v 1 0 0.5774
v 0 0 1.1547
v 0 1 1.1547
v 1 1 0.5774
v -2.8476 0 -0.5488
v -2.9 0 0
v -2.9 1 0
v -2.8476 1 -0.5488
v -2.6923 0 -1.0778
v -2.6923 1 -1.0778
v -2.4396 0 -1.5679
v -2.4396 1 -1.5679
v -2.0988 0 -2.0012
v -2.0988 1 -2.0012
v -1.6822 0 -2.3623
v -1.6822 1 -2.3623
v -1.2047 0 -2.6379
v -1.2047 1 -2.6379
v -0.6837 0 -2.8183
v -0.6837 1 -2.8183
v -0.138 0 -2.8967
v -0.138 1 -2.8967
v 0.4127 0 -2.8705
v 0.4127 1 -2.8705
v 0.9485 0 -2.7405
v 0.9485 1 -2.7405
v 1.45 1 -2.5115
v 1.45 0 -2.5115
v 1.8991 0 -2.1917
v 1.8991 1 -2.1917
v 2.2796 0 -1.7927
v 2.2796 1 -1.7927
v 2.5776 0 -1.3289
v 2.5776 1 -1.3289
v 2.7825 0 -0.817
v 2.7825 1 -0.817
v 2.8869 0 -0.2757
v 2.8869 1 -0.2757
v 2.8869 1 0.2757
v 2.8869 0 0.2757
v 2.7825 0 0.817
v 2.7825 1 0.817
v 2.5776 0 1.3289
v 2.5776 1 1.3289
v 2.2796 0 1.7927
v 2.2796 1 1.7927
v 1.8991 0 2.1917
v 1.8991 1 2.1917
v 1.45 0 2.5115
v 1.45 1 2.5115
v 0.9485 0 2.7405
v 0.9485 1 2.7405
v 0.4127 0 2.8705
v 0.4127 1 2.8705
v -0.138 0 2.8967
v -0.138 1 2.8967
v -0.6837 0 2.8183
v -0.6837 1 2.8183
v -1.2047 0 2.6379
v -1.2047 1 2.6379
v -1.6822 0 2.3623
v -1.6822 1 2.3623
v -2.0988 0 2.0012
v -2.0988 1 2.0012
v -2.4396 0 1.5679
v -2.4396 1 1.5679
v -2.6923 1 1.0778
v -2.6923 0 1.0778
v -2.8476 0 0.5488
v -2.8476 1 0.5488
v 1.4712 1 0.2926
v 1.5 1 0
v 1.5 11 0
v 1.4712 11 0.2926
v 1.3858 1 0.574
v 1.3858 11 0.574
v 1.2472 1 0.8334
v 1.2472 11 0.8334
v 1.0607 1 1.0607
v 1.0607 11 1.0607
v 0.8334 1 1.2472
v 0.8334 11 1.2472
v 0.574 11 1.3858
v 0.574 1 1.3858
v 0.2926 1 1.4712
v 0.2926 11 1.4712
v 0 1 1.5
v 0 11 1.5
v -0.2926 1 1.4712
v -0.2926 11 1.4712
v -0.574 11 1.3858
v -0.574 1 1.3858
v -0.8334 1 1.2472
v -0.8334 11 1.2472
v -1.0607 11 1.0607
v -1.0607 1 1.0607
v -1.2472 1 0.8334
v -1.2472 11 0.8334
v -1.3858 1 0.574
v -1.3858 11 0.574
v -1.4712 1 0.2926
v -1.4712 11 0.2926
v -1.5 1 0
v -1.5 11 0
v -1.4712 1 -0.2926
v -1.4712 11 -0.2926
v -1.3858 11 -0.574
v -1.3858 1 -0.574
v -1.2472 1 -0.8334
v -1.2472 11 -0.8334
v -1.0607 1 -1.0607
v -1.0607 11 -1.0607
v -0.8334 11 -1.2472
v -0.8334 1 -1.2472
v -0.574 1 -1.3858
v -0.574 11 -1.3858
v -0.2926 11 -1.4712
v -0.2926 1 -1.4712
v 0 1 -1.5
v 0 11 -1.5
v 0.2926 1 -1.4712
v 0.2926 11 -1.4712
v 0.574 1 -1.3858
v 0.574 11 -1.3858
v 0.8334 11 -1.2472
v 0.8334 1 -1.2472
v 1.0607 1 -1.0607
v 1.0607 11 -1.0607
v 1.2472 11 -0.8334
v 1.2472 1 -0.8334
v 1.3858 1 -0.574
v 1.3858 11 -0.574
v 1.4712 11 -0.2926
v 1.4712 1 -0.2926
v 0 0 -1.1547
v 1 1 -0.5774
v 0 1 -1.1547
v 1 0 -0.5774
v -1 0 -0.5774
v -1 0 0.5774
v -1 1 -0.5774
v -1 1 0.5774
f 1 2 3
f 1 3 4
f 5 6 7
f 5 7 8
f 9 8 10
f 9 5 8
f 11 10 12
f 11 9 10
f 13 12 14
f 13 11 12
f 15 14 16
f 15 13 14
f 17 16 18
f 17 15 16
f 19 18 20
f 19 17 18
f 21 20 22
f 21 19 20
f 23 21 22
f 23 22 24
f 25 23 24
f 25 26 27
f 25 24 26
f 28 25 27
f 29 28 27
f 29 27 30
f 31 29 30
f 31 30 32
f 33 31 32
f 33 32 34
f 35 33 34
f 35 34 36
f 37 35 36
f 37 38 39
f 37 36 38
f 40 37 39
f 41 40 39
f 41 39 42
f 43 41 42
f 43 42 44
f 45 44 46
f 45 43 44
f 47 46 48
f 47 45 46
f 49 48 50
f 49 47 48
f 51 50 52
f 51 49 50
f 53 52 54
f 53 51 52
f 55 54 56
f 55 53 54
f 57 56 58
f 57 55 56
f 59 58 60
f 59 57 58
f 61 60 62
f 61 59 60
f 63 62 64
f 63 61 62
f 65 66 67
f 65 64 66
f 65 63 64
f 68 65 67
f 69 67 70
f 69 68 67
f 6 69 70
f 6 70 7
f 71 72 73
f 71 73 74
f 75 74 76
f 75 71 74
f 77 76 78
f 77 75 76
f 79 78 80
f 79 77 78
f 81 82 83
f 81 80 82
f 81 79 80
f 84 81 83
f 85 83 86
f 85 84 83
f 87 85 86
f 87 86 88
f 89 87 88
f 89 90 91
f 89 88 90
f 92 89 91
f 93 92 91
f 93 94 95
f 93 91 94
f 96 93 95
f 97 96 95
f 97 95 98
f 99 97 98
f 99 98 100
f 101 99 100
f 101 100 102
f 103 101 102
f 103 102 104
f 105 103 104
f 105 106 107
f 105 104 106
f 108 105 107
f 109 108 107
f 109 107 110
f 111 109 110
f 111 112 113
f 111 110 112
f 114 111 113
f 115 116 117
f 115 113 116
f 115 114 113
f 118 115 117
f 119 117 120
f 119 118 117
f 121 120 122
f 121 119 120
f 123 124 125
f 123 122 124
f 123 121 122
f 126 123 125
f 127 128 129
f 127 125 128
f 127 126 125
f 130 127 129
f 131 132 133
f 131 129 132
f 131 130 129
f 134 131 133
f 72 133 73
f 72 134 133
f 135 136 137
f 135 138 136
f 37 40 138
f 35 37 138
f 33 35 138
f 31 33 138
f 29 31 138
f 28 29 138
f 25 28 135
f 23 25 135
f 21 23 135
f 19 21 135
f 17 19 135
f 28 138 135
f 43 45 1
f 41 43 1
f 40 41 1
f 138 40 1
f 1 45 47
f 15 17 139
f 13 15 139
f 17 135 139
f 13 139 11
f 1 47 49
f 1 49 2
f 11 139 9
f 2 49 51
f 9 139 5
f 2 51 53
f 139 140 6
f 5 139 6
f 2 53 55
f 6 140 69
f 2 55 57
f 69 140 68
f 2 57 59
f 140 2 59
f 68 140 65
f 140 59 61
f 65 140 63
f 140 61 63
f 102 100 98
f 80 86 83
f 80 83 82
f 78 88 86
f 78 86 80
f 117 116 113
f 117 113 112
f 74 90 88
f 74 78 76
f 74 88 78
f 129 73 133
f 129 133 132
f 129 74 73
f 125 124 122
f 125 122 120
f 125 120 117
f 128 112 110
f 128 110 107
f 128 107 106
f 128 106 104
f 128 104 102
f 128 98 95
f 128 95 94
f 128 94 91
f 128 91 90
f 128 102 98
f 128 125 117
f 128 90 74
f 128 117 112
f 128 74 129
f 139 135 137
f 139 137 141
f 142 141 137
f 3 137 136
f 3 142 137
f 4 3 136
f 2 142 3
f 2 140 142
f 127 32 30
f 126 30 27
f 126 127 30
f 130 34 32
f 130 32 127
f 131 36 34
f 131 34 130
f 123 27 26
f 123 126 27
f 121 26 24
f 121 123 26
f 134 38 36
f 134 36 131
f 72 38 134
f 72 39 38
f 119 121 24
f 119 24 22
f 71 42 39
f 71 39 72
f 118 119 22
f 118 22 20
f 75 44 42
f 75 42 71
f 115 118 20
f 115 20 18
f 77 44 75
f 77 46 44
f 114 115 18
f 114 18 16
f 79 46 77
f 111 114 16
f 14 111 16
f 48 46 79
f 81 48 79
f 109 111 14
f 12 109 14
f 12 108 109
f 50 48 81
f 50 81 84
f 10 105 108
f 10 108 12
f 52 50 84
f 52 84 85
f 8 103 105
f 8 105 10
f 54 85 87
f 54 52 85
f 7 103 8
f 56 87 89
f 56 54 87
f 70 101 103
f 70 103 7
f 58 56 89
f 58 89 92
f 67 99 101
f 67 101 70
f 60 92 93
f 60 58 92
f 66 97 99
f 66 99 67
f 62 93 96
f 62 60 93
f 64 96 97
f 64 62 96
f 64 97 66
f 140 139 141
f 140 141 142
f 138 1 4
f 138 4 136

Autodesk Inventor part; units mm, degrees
ref_plane "YZ Plane" through (0, 0, 0) normal (1, 0, 0) x (0, 1, 0)
ref_plane "XZ Plane" through (0, 0, 0) normal (0, 1, 0) x (-1, 0, 0)
ref_plane "XY Plane" through (0, 0, 0) normal (0, 0, 1) x (1, 0, 0)
sketch "Sketch1" plane through (0, 0, 0) normal (0, 1, 0) x (-1, 0, 0)
  circle A0 centre (0, 0) radius 2.9
  dimension "d0" = 5.8
extrude "Extrusion1" add sketch "Sketch1" along normal blind 1
sketch "Sketch2" plane through (0, 1, 0) normal (0, 1, 0) x (1, 0, 0)
  circle A0 centre (0, 0) radius 1.5
  dimension "d3" = 3
extrude "Extrusion2" add sketch "Sketch2" along normal blind 10
sketch "Sketch3" plane through (0, 0, 0) normal (0, -1, 0) x (1, 0, 0)
  line L0 (0, -1.1547) -> (-1, -0.5774)
  line L1 (-1, -0.5774) -> (-1, 0.5774)
  line L2 (-1, 0.5774) -> (0, 1.1547)
  line L3 (0, 1.1547) -> (1, 0.5774)
  line L4 (1, 0.5774) -> (1, -0.5774)
  line L5 (1, -0.5774) -> (0, -1.1547)
  point P0 (0, 0)
  point P1 (0, 0)
  dimension "d6" = 2
extrude "Extrusion3" cut sketch "Sketch3" against normal blind 1
properties part number "m3_bolt_pan_8mm" material "Stainless Steel"
